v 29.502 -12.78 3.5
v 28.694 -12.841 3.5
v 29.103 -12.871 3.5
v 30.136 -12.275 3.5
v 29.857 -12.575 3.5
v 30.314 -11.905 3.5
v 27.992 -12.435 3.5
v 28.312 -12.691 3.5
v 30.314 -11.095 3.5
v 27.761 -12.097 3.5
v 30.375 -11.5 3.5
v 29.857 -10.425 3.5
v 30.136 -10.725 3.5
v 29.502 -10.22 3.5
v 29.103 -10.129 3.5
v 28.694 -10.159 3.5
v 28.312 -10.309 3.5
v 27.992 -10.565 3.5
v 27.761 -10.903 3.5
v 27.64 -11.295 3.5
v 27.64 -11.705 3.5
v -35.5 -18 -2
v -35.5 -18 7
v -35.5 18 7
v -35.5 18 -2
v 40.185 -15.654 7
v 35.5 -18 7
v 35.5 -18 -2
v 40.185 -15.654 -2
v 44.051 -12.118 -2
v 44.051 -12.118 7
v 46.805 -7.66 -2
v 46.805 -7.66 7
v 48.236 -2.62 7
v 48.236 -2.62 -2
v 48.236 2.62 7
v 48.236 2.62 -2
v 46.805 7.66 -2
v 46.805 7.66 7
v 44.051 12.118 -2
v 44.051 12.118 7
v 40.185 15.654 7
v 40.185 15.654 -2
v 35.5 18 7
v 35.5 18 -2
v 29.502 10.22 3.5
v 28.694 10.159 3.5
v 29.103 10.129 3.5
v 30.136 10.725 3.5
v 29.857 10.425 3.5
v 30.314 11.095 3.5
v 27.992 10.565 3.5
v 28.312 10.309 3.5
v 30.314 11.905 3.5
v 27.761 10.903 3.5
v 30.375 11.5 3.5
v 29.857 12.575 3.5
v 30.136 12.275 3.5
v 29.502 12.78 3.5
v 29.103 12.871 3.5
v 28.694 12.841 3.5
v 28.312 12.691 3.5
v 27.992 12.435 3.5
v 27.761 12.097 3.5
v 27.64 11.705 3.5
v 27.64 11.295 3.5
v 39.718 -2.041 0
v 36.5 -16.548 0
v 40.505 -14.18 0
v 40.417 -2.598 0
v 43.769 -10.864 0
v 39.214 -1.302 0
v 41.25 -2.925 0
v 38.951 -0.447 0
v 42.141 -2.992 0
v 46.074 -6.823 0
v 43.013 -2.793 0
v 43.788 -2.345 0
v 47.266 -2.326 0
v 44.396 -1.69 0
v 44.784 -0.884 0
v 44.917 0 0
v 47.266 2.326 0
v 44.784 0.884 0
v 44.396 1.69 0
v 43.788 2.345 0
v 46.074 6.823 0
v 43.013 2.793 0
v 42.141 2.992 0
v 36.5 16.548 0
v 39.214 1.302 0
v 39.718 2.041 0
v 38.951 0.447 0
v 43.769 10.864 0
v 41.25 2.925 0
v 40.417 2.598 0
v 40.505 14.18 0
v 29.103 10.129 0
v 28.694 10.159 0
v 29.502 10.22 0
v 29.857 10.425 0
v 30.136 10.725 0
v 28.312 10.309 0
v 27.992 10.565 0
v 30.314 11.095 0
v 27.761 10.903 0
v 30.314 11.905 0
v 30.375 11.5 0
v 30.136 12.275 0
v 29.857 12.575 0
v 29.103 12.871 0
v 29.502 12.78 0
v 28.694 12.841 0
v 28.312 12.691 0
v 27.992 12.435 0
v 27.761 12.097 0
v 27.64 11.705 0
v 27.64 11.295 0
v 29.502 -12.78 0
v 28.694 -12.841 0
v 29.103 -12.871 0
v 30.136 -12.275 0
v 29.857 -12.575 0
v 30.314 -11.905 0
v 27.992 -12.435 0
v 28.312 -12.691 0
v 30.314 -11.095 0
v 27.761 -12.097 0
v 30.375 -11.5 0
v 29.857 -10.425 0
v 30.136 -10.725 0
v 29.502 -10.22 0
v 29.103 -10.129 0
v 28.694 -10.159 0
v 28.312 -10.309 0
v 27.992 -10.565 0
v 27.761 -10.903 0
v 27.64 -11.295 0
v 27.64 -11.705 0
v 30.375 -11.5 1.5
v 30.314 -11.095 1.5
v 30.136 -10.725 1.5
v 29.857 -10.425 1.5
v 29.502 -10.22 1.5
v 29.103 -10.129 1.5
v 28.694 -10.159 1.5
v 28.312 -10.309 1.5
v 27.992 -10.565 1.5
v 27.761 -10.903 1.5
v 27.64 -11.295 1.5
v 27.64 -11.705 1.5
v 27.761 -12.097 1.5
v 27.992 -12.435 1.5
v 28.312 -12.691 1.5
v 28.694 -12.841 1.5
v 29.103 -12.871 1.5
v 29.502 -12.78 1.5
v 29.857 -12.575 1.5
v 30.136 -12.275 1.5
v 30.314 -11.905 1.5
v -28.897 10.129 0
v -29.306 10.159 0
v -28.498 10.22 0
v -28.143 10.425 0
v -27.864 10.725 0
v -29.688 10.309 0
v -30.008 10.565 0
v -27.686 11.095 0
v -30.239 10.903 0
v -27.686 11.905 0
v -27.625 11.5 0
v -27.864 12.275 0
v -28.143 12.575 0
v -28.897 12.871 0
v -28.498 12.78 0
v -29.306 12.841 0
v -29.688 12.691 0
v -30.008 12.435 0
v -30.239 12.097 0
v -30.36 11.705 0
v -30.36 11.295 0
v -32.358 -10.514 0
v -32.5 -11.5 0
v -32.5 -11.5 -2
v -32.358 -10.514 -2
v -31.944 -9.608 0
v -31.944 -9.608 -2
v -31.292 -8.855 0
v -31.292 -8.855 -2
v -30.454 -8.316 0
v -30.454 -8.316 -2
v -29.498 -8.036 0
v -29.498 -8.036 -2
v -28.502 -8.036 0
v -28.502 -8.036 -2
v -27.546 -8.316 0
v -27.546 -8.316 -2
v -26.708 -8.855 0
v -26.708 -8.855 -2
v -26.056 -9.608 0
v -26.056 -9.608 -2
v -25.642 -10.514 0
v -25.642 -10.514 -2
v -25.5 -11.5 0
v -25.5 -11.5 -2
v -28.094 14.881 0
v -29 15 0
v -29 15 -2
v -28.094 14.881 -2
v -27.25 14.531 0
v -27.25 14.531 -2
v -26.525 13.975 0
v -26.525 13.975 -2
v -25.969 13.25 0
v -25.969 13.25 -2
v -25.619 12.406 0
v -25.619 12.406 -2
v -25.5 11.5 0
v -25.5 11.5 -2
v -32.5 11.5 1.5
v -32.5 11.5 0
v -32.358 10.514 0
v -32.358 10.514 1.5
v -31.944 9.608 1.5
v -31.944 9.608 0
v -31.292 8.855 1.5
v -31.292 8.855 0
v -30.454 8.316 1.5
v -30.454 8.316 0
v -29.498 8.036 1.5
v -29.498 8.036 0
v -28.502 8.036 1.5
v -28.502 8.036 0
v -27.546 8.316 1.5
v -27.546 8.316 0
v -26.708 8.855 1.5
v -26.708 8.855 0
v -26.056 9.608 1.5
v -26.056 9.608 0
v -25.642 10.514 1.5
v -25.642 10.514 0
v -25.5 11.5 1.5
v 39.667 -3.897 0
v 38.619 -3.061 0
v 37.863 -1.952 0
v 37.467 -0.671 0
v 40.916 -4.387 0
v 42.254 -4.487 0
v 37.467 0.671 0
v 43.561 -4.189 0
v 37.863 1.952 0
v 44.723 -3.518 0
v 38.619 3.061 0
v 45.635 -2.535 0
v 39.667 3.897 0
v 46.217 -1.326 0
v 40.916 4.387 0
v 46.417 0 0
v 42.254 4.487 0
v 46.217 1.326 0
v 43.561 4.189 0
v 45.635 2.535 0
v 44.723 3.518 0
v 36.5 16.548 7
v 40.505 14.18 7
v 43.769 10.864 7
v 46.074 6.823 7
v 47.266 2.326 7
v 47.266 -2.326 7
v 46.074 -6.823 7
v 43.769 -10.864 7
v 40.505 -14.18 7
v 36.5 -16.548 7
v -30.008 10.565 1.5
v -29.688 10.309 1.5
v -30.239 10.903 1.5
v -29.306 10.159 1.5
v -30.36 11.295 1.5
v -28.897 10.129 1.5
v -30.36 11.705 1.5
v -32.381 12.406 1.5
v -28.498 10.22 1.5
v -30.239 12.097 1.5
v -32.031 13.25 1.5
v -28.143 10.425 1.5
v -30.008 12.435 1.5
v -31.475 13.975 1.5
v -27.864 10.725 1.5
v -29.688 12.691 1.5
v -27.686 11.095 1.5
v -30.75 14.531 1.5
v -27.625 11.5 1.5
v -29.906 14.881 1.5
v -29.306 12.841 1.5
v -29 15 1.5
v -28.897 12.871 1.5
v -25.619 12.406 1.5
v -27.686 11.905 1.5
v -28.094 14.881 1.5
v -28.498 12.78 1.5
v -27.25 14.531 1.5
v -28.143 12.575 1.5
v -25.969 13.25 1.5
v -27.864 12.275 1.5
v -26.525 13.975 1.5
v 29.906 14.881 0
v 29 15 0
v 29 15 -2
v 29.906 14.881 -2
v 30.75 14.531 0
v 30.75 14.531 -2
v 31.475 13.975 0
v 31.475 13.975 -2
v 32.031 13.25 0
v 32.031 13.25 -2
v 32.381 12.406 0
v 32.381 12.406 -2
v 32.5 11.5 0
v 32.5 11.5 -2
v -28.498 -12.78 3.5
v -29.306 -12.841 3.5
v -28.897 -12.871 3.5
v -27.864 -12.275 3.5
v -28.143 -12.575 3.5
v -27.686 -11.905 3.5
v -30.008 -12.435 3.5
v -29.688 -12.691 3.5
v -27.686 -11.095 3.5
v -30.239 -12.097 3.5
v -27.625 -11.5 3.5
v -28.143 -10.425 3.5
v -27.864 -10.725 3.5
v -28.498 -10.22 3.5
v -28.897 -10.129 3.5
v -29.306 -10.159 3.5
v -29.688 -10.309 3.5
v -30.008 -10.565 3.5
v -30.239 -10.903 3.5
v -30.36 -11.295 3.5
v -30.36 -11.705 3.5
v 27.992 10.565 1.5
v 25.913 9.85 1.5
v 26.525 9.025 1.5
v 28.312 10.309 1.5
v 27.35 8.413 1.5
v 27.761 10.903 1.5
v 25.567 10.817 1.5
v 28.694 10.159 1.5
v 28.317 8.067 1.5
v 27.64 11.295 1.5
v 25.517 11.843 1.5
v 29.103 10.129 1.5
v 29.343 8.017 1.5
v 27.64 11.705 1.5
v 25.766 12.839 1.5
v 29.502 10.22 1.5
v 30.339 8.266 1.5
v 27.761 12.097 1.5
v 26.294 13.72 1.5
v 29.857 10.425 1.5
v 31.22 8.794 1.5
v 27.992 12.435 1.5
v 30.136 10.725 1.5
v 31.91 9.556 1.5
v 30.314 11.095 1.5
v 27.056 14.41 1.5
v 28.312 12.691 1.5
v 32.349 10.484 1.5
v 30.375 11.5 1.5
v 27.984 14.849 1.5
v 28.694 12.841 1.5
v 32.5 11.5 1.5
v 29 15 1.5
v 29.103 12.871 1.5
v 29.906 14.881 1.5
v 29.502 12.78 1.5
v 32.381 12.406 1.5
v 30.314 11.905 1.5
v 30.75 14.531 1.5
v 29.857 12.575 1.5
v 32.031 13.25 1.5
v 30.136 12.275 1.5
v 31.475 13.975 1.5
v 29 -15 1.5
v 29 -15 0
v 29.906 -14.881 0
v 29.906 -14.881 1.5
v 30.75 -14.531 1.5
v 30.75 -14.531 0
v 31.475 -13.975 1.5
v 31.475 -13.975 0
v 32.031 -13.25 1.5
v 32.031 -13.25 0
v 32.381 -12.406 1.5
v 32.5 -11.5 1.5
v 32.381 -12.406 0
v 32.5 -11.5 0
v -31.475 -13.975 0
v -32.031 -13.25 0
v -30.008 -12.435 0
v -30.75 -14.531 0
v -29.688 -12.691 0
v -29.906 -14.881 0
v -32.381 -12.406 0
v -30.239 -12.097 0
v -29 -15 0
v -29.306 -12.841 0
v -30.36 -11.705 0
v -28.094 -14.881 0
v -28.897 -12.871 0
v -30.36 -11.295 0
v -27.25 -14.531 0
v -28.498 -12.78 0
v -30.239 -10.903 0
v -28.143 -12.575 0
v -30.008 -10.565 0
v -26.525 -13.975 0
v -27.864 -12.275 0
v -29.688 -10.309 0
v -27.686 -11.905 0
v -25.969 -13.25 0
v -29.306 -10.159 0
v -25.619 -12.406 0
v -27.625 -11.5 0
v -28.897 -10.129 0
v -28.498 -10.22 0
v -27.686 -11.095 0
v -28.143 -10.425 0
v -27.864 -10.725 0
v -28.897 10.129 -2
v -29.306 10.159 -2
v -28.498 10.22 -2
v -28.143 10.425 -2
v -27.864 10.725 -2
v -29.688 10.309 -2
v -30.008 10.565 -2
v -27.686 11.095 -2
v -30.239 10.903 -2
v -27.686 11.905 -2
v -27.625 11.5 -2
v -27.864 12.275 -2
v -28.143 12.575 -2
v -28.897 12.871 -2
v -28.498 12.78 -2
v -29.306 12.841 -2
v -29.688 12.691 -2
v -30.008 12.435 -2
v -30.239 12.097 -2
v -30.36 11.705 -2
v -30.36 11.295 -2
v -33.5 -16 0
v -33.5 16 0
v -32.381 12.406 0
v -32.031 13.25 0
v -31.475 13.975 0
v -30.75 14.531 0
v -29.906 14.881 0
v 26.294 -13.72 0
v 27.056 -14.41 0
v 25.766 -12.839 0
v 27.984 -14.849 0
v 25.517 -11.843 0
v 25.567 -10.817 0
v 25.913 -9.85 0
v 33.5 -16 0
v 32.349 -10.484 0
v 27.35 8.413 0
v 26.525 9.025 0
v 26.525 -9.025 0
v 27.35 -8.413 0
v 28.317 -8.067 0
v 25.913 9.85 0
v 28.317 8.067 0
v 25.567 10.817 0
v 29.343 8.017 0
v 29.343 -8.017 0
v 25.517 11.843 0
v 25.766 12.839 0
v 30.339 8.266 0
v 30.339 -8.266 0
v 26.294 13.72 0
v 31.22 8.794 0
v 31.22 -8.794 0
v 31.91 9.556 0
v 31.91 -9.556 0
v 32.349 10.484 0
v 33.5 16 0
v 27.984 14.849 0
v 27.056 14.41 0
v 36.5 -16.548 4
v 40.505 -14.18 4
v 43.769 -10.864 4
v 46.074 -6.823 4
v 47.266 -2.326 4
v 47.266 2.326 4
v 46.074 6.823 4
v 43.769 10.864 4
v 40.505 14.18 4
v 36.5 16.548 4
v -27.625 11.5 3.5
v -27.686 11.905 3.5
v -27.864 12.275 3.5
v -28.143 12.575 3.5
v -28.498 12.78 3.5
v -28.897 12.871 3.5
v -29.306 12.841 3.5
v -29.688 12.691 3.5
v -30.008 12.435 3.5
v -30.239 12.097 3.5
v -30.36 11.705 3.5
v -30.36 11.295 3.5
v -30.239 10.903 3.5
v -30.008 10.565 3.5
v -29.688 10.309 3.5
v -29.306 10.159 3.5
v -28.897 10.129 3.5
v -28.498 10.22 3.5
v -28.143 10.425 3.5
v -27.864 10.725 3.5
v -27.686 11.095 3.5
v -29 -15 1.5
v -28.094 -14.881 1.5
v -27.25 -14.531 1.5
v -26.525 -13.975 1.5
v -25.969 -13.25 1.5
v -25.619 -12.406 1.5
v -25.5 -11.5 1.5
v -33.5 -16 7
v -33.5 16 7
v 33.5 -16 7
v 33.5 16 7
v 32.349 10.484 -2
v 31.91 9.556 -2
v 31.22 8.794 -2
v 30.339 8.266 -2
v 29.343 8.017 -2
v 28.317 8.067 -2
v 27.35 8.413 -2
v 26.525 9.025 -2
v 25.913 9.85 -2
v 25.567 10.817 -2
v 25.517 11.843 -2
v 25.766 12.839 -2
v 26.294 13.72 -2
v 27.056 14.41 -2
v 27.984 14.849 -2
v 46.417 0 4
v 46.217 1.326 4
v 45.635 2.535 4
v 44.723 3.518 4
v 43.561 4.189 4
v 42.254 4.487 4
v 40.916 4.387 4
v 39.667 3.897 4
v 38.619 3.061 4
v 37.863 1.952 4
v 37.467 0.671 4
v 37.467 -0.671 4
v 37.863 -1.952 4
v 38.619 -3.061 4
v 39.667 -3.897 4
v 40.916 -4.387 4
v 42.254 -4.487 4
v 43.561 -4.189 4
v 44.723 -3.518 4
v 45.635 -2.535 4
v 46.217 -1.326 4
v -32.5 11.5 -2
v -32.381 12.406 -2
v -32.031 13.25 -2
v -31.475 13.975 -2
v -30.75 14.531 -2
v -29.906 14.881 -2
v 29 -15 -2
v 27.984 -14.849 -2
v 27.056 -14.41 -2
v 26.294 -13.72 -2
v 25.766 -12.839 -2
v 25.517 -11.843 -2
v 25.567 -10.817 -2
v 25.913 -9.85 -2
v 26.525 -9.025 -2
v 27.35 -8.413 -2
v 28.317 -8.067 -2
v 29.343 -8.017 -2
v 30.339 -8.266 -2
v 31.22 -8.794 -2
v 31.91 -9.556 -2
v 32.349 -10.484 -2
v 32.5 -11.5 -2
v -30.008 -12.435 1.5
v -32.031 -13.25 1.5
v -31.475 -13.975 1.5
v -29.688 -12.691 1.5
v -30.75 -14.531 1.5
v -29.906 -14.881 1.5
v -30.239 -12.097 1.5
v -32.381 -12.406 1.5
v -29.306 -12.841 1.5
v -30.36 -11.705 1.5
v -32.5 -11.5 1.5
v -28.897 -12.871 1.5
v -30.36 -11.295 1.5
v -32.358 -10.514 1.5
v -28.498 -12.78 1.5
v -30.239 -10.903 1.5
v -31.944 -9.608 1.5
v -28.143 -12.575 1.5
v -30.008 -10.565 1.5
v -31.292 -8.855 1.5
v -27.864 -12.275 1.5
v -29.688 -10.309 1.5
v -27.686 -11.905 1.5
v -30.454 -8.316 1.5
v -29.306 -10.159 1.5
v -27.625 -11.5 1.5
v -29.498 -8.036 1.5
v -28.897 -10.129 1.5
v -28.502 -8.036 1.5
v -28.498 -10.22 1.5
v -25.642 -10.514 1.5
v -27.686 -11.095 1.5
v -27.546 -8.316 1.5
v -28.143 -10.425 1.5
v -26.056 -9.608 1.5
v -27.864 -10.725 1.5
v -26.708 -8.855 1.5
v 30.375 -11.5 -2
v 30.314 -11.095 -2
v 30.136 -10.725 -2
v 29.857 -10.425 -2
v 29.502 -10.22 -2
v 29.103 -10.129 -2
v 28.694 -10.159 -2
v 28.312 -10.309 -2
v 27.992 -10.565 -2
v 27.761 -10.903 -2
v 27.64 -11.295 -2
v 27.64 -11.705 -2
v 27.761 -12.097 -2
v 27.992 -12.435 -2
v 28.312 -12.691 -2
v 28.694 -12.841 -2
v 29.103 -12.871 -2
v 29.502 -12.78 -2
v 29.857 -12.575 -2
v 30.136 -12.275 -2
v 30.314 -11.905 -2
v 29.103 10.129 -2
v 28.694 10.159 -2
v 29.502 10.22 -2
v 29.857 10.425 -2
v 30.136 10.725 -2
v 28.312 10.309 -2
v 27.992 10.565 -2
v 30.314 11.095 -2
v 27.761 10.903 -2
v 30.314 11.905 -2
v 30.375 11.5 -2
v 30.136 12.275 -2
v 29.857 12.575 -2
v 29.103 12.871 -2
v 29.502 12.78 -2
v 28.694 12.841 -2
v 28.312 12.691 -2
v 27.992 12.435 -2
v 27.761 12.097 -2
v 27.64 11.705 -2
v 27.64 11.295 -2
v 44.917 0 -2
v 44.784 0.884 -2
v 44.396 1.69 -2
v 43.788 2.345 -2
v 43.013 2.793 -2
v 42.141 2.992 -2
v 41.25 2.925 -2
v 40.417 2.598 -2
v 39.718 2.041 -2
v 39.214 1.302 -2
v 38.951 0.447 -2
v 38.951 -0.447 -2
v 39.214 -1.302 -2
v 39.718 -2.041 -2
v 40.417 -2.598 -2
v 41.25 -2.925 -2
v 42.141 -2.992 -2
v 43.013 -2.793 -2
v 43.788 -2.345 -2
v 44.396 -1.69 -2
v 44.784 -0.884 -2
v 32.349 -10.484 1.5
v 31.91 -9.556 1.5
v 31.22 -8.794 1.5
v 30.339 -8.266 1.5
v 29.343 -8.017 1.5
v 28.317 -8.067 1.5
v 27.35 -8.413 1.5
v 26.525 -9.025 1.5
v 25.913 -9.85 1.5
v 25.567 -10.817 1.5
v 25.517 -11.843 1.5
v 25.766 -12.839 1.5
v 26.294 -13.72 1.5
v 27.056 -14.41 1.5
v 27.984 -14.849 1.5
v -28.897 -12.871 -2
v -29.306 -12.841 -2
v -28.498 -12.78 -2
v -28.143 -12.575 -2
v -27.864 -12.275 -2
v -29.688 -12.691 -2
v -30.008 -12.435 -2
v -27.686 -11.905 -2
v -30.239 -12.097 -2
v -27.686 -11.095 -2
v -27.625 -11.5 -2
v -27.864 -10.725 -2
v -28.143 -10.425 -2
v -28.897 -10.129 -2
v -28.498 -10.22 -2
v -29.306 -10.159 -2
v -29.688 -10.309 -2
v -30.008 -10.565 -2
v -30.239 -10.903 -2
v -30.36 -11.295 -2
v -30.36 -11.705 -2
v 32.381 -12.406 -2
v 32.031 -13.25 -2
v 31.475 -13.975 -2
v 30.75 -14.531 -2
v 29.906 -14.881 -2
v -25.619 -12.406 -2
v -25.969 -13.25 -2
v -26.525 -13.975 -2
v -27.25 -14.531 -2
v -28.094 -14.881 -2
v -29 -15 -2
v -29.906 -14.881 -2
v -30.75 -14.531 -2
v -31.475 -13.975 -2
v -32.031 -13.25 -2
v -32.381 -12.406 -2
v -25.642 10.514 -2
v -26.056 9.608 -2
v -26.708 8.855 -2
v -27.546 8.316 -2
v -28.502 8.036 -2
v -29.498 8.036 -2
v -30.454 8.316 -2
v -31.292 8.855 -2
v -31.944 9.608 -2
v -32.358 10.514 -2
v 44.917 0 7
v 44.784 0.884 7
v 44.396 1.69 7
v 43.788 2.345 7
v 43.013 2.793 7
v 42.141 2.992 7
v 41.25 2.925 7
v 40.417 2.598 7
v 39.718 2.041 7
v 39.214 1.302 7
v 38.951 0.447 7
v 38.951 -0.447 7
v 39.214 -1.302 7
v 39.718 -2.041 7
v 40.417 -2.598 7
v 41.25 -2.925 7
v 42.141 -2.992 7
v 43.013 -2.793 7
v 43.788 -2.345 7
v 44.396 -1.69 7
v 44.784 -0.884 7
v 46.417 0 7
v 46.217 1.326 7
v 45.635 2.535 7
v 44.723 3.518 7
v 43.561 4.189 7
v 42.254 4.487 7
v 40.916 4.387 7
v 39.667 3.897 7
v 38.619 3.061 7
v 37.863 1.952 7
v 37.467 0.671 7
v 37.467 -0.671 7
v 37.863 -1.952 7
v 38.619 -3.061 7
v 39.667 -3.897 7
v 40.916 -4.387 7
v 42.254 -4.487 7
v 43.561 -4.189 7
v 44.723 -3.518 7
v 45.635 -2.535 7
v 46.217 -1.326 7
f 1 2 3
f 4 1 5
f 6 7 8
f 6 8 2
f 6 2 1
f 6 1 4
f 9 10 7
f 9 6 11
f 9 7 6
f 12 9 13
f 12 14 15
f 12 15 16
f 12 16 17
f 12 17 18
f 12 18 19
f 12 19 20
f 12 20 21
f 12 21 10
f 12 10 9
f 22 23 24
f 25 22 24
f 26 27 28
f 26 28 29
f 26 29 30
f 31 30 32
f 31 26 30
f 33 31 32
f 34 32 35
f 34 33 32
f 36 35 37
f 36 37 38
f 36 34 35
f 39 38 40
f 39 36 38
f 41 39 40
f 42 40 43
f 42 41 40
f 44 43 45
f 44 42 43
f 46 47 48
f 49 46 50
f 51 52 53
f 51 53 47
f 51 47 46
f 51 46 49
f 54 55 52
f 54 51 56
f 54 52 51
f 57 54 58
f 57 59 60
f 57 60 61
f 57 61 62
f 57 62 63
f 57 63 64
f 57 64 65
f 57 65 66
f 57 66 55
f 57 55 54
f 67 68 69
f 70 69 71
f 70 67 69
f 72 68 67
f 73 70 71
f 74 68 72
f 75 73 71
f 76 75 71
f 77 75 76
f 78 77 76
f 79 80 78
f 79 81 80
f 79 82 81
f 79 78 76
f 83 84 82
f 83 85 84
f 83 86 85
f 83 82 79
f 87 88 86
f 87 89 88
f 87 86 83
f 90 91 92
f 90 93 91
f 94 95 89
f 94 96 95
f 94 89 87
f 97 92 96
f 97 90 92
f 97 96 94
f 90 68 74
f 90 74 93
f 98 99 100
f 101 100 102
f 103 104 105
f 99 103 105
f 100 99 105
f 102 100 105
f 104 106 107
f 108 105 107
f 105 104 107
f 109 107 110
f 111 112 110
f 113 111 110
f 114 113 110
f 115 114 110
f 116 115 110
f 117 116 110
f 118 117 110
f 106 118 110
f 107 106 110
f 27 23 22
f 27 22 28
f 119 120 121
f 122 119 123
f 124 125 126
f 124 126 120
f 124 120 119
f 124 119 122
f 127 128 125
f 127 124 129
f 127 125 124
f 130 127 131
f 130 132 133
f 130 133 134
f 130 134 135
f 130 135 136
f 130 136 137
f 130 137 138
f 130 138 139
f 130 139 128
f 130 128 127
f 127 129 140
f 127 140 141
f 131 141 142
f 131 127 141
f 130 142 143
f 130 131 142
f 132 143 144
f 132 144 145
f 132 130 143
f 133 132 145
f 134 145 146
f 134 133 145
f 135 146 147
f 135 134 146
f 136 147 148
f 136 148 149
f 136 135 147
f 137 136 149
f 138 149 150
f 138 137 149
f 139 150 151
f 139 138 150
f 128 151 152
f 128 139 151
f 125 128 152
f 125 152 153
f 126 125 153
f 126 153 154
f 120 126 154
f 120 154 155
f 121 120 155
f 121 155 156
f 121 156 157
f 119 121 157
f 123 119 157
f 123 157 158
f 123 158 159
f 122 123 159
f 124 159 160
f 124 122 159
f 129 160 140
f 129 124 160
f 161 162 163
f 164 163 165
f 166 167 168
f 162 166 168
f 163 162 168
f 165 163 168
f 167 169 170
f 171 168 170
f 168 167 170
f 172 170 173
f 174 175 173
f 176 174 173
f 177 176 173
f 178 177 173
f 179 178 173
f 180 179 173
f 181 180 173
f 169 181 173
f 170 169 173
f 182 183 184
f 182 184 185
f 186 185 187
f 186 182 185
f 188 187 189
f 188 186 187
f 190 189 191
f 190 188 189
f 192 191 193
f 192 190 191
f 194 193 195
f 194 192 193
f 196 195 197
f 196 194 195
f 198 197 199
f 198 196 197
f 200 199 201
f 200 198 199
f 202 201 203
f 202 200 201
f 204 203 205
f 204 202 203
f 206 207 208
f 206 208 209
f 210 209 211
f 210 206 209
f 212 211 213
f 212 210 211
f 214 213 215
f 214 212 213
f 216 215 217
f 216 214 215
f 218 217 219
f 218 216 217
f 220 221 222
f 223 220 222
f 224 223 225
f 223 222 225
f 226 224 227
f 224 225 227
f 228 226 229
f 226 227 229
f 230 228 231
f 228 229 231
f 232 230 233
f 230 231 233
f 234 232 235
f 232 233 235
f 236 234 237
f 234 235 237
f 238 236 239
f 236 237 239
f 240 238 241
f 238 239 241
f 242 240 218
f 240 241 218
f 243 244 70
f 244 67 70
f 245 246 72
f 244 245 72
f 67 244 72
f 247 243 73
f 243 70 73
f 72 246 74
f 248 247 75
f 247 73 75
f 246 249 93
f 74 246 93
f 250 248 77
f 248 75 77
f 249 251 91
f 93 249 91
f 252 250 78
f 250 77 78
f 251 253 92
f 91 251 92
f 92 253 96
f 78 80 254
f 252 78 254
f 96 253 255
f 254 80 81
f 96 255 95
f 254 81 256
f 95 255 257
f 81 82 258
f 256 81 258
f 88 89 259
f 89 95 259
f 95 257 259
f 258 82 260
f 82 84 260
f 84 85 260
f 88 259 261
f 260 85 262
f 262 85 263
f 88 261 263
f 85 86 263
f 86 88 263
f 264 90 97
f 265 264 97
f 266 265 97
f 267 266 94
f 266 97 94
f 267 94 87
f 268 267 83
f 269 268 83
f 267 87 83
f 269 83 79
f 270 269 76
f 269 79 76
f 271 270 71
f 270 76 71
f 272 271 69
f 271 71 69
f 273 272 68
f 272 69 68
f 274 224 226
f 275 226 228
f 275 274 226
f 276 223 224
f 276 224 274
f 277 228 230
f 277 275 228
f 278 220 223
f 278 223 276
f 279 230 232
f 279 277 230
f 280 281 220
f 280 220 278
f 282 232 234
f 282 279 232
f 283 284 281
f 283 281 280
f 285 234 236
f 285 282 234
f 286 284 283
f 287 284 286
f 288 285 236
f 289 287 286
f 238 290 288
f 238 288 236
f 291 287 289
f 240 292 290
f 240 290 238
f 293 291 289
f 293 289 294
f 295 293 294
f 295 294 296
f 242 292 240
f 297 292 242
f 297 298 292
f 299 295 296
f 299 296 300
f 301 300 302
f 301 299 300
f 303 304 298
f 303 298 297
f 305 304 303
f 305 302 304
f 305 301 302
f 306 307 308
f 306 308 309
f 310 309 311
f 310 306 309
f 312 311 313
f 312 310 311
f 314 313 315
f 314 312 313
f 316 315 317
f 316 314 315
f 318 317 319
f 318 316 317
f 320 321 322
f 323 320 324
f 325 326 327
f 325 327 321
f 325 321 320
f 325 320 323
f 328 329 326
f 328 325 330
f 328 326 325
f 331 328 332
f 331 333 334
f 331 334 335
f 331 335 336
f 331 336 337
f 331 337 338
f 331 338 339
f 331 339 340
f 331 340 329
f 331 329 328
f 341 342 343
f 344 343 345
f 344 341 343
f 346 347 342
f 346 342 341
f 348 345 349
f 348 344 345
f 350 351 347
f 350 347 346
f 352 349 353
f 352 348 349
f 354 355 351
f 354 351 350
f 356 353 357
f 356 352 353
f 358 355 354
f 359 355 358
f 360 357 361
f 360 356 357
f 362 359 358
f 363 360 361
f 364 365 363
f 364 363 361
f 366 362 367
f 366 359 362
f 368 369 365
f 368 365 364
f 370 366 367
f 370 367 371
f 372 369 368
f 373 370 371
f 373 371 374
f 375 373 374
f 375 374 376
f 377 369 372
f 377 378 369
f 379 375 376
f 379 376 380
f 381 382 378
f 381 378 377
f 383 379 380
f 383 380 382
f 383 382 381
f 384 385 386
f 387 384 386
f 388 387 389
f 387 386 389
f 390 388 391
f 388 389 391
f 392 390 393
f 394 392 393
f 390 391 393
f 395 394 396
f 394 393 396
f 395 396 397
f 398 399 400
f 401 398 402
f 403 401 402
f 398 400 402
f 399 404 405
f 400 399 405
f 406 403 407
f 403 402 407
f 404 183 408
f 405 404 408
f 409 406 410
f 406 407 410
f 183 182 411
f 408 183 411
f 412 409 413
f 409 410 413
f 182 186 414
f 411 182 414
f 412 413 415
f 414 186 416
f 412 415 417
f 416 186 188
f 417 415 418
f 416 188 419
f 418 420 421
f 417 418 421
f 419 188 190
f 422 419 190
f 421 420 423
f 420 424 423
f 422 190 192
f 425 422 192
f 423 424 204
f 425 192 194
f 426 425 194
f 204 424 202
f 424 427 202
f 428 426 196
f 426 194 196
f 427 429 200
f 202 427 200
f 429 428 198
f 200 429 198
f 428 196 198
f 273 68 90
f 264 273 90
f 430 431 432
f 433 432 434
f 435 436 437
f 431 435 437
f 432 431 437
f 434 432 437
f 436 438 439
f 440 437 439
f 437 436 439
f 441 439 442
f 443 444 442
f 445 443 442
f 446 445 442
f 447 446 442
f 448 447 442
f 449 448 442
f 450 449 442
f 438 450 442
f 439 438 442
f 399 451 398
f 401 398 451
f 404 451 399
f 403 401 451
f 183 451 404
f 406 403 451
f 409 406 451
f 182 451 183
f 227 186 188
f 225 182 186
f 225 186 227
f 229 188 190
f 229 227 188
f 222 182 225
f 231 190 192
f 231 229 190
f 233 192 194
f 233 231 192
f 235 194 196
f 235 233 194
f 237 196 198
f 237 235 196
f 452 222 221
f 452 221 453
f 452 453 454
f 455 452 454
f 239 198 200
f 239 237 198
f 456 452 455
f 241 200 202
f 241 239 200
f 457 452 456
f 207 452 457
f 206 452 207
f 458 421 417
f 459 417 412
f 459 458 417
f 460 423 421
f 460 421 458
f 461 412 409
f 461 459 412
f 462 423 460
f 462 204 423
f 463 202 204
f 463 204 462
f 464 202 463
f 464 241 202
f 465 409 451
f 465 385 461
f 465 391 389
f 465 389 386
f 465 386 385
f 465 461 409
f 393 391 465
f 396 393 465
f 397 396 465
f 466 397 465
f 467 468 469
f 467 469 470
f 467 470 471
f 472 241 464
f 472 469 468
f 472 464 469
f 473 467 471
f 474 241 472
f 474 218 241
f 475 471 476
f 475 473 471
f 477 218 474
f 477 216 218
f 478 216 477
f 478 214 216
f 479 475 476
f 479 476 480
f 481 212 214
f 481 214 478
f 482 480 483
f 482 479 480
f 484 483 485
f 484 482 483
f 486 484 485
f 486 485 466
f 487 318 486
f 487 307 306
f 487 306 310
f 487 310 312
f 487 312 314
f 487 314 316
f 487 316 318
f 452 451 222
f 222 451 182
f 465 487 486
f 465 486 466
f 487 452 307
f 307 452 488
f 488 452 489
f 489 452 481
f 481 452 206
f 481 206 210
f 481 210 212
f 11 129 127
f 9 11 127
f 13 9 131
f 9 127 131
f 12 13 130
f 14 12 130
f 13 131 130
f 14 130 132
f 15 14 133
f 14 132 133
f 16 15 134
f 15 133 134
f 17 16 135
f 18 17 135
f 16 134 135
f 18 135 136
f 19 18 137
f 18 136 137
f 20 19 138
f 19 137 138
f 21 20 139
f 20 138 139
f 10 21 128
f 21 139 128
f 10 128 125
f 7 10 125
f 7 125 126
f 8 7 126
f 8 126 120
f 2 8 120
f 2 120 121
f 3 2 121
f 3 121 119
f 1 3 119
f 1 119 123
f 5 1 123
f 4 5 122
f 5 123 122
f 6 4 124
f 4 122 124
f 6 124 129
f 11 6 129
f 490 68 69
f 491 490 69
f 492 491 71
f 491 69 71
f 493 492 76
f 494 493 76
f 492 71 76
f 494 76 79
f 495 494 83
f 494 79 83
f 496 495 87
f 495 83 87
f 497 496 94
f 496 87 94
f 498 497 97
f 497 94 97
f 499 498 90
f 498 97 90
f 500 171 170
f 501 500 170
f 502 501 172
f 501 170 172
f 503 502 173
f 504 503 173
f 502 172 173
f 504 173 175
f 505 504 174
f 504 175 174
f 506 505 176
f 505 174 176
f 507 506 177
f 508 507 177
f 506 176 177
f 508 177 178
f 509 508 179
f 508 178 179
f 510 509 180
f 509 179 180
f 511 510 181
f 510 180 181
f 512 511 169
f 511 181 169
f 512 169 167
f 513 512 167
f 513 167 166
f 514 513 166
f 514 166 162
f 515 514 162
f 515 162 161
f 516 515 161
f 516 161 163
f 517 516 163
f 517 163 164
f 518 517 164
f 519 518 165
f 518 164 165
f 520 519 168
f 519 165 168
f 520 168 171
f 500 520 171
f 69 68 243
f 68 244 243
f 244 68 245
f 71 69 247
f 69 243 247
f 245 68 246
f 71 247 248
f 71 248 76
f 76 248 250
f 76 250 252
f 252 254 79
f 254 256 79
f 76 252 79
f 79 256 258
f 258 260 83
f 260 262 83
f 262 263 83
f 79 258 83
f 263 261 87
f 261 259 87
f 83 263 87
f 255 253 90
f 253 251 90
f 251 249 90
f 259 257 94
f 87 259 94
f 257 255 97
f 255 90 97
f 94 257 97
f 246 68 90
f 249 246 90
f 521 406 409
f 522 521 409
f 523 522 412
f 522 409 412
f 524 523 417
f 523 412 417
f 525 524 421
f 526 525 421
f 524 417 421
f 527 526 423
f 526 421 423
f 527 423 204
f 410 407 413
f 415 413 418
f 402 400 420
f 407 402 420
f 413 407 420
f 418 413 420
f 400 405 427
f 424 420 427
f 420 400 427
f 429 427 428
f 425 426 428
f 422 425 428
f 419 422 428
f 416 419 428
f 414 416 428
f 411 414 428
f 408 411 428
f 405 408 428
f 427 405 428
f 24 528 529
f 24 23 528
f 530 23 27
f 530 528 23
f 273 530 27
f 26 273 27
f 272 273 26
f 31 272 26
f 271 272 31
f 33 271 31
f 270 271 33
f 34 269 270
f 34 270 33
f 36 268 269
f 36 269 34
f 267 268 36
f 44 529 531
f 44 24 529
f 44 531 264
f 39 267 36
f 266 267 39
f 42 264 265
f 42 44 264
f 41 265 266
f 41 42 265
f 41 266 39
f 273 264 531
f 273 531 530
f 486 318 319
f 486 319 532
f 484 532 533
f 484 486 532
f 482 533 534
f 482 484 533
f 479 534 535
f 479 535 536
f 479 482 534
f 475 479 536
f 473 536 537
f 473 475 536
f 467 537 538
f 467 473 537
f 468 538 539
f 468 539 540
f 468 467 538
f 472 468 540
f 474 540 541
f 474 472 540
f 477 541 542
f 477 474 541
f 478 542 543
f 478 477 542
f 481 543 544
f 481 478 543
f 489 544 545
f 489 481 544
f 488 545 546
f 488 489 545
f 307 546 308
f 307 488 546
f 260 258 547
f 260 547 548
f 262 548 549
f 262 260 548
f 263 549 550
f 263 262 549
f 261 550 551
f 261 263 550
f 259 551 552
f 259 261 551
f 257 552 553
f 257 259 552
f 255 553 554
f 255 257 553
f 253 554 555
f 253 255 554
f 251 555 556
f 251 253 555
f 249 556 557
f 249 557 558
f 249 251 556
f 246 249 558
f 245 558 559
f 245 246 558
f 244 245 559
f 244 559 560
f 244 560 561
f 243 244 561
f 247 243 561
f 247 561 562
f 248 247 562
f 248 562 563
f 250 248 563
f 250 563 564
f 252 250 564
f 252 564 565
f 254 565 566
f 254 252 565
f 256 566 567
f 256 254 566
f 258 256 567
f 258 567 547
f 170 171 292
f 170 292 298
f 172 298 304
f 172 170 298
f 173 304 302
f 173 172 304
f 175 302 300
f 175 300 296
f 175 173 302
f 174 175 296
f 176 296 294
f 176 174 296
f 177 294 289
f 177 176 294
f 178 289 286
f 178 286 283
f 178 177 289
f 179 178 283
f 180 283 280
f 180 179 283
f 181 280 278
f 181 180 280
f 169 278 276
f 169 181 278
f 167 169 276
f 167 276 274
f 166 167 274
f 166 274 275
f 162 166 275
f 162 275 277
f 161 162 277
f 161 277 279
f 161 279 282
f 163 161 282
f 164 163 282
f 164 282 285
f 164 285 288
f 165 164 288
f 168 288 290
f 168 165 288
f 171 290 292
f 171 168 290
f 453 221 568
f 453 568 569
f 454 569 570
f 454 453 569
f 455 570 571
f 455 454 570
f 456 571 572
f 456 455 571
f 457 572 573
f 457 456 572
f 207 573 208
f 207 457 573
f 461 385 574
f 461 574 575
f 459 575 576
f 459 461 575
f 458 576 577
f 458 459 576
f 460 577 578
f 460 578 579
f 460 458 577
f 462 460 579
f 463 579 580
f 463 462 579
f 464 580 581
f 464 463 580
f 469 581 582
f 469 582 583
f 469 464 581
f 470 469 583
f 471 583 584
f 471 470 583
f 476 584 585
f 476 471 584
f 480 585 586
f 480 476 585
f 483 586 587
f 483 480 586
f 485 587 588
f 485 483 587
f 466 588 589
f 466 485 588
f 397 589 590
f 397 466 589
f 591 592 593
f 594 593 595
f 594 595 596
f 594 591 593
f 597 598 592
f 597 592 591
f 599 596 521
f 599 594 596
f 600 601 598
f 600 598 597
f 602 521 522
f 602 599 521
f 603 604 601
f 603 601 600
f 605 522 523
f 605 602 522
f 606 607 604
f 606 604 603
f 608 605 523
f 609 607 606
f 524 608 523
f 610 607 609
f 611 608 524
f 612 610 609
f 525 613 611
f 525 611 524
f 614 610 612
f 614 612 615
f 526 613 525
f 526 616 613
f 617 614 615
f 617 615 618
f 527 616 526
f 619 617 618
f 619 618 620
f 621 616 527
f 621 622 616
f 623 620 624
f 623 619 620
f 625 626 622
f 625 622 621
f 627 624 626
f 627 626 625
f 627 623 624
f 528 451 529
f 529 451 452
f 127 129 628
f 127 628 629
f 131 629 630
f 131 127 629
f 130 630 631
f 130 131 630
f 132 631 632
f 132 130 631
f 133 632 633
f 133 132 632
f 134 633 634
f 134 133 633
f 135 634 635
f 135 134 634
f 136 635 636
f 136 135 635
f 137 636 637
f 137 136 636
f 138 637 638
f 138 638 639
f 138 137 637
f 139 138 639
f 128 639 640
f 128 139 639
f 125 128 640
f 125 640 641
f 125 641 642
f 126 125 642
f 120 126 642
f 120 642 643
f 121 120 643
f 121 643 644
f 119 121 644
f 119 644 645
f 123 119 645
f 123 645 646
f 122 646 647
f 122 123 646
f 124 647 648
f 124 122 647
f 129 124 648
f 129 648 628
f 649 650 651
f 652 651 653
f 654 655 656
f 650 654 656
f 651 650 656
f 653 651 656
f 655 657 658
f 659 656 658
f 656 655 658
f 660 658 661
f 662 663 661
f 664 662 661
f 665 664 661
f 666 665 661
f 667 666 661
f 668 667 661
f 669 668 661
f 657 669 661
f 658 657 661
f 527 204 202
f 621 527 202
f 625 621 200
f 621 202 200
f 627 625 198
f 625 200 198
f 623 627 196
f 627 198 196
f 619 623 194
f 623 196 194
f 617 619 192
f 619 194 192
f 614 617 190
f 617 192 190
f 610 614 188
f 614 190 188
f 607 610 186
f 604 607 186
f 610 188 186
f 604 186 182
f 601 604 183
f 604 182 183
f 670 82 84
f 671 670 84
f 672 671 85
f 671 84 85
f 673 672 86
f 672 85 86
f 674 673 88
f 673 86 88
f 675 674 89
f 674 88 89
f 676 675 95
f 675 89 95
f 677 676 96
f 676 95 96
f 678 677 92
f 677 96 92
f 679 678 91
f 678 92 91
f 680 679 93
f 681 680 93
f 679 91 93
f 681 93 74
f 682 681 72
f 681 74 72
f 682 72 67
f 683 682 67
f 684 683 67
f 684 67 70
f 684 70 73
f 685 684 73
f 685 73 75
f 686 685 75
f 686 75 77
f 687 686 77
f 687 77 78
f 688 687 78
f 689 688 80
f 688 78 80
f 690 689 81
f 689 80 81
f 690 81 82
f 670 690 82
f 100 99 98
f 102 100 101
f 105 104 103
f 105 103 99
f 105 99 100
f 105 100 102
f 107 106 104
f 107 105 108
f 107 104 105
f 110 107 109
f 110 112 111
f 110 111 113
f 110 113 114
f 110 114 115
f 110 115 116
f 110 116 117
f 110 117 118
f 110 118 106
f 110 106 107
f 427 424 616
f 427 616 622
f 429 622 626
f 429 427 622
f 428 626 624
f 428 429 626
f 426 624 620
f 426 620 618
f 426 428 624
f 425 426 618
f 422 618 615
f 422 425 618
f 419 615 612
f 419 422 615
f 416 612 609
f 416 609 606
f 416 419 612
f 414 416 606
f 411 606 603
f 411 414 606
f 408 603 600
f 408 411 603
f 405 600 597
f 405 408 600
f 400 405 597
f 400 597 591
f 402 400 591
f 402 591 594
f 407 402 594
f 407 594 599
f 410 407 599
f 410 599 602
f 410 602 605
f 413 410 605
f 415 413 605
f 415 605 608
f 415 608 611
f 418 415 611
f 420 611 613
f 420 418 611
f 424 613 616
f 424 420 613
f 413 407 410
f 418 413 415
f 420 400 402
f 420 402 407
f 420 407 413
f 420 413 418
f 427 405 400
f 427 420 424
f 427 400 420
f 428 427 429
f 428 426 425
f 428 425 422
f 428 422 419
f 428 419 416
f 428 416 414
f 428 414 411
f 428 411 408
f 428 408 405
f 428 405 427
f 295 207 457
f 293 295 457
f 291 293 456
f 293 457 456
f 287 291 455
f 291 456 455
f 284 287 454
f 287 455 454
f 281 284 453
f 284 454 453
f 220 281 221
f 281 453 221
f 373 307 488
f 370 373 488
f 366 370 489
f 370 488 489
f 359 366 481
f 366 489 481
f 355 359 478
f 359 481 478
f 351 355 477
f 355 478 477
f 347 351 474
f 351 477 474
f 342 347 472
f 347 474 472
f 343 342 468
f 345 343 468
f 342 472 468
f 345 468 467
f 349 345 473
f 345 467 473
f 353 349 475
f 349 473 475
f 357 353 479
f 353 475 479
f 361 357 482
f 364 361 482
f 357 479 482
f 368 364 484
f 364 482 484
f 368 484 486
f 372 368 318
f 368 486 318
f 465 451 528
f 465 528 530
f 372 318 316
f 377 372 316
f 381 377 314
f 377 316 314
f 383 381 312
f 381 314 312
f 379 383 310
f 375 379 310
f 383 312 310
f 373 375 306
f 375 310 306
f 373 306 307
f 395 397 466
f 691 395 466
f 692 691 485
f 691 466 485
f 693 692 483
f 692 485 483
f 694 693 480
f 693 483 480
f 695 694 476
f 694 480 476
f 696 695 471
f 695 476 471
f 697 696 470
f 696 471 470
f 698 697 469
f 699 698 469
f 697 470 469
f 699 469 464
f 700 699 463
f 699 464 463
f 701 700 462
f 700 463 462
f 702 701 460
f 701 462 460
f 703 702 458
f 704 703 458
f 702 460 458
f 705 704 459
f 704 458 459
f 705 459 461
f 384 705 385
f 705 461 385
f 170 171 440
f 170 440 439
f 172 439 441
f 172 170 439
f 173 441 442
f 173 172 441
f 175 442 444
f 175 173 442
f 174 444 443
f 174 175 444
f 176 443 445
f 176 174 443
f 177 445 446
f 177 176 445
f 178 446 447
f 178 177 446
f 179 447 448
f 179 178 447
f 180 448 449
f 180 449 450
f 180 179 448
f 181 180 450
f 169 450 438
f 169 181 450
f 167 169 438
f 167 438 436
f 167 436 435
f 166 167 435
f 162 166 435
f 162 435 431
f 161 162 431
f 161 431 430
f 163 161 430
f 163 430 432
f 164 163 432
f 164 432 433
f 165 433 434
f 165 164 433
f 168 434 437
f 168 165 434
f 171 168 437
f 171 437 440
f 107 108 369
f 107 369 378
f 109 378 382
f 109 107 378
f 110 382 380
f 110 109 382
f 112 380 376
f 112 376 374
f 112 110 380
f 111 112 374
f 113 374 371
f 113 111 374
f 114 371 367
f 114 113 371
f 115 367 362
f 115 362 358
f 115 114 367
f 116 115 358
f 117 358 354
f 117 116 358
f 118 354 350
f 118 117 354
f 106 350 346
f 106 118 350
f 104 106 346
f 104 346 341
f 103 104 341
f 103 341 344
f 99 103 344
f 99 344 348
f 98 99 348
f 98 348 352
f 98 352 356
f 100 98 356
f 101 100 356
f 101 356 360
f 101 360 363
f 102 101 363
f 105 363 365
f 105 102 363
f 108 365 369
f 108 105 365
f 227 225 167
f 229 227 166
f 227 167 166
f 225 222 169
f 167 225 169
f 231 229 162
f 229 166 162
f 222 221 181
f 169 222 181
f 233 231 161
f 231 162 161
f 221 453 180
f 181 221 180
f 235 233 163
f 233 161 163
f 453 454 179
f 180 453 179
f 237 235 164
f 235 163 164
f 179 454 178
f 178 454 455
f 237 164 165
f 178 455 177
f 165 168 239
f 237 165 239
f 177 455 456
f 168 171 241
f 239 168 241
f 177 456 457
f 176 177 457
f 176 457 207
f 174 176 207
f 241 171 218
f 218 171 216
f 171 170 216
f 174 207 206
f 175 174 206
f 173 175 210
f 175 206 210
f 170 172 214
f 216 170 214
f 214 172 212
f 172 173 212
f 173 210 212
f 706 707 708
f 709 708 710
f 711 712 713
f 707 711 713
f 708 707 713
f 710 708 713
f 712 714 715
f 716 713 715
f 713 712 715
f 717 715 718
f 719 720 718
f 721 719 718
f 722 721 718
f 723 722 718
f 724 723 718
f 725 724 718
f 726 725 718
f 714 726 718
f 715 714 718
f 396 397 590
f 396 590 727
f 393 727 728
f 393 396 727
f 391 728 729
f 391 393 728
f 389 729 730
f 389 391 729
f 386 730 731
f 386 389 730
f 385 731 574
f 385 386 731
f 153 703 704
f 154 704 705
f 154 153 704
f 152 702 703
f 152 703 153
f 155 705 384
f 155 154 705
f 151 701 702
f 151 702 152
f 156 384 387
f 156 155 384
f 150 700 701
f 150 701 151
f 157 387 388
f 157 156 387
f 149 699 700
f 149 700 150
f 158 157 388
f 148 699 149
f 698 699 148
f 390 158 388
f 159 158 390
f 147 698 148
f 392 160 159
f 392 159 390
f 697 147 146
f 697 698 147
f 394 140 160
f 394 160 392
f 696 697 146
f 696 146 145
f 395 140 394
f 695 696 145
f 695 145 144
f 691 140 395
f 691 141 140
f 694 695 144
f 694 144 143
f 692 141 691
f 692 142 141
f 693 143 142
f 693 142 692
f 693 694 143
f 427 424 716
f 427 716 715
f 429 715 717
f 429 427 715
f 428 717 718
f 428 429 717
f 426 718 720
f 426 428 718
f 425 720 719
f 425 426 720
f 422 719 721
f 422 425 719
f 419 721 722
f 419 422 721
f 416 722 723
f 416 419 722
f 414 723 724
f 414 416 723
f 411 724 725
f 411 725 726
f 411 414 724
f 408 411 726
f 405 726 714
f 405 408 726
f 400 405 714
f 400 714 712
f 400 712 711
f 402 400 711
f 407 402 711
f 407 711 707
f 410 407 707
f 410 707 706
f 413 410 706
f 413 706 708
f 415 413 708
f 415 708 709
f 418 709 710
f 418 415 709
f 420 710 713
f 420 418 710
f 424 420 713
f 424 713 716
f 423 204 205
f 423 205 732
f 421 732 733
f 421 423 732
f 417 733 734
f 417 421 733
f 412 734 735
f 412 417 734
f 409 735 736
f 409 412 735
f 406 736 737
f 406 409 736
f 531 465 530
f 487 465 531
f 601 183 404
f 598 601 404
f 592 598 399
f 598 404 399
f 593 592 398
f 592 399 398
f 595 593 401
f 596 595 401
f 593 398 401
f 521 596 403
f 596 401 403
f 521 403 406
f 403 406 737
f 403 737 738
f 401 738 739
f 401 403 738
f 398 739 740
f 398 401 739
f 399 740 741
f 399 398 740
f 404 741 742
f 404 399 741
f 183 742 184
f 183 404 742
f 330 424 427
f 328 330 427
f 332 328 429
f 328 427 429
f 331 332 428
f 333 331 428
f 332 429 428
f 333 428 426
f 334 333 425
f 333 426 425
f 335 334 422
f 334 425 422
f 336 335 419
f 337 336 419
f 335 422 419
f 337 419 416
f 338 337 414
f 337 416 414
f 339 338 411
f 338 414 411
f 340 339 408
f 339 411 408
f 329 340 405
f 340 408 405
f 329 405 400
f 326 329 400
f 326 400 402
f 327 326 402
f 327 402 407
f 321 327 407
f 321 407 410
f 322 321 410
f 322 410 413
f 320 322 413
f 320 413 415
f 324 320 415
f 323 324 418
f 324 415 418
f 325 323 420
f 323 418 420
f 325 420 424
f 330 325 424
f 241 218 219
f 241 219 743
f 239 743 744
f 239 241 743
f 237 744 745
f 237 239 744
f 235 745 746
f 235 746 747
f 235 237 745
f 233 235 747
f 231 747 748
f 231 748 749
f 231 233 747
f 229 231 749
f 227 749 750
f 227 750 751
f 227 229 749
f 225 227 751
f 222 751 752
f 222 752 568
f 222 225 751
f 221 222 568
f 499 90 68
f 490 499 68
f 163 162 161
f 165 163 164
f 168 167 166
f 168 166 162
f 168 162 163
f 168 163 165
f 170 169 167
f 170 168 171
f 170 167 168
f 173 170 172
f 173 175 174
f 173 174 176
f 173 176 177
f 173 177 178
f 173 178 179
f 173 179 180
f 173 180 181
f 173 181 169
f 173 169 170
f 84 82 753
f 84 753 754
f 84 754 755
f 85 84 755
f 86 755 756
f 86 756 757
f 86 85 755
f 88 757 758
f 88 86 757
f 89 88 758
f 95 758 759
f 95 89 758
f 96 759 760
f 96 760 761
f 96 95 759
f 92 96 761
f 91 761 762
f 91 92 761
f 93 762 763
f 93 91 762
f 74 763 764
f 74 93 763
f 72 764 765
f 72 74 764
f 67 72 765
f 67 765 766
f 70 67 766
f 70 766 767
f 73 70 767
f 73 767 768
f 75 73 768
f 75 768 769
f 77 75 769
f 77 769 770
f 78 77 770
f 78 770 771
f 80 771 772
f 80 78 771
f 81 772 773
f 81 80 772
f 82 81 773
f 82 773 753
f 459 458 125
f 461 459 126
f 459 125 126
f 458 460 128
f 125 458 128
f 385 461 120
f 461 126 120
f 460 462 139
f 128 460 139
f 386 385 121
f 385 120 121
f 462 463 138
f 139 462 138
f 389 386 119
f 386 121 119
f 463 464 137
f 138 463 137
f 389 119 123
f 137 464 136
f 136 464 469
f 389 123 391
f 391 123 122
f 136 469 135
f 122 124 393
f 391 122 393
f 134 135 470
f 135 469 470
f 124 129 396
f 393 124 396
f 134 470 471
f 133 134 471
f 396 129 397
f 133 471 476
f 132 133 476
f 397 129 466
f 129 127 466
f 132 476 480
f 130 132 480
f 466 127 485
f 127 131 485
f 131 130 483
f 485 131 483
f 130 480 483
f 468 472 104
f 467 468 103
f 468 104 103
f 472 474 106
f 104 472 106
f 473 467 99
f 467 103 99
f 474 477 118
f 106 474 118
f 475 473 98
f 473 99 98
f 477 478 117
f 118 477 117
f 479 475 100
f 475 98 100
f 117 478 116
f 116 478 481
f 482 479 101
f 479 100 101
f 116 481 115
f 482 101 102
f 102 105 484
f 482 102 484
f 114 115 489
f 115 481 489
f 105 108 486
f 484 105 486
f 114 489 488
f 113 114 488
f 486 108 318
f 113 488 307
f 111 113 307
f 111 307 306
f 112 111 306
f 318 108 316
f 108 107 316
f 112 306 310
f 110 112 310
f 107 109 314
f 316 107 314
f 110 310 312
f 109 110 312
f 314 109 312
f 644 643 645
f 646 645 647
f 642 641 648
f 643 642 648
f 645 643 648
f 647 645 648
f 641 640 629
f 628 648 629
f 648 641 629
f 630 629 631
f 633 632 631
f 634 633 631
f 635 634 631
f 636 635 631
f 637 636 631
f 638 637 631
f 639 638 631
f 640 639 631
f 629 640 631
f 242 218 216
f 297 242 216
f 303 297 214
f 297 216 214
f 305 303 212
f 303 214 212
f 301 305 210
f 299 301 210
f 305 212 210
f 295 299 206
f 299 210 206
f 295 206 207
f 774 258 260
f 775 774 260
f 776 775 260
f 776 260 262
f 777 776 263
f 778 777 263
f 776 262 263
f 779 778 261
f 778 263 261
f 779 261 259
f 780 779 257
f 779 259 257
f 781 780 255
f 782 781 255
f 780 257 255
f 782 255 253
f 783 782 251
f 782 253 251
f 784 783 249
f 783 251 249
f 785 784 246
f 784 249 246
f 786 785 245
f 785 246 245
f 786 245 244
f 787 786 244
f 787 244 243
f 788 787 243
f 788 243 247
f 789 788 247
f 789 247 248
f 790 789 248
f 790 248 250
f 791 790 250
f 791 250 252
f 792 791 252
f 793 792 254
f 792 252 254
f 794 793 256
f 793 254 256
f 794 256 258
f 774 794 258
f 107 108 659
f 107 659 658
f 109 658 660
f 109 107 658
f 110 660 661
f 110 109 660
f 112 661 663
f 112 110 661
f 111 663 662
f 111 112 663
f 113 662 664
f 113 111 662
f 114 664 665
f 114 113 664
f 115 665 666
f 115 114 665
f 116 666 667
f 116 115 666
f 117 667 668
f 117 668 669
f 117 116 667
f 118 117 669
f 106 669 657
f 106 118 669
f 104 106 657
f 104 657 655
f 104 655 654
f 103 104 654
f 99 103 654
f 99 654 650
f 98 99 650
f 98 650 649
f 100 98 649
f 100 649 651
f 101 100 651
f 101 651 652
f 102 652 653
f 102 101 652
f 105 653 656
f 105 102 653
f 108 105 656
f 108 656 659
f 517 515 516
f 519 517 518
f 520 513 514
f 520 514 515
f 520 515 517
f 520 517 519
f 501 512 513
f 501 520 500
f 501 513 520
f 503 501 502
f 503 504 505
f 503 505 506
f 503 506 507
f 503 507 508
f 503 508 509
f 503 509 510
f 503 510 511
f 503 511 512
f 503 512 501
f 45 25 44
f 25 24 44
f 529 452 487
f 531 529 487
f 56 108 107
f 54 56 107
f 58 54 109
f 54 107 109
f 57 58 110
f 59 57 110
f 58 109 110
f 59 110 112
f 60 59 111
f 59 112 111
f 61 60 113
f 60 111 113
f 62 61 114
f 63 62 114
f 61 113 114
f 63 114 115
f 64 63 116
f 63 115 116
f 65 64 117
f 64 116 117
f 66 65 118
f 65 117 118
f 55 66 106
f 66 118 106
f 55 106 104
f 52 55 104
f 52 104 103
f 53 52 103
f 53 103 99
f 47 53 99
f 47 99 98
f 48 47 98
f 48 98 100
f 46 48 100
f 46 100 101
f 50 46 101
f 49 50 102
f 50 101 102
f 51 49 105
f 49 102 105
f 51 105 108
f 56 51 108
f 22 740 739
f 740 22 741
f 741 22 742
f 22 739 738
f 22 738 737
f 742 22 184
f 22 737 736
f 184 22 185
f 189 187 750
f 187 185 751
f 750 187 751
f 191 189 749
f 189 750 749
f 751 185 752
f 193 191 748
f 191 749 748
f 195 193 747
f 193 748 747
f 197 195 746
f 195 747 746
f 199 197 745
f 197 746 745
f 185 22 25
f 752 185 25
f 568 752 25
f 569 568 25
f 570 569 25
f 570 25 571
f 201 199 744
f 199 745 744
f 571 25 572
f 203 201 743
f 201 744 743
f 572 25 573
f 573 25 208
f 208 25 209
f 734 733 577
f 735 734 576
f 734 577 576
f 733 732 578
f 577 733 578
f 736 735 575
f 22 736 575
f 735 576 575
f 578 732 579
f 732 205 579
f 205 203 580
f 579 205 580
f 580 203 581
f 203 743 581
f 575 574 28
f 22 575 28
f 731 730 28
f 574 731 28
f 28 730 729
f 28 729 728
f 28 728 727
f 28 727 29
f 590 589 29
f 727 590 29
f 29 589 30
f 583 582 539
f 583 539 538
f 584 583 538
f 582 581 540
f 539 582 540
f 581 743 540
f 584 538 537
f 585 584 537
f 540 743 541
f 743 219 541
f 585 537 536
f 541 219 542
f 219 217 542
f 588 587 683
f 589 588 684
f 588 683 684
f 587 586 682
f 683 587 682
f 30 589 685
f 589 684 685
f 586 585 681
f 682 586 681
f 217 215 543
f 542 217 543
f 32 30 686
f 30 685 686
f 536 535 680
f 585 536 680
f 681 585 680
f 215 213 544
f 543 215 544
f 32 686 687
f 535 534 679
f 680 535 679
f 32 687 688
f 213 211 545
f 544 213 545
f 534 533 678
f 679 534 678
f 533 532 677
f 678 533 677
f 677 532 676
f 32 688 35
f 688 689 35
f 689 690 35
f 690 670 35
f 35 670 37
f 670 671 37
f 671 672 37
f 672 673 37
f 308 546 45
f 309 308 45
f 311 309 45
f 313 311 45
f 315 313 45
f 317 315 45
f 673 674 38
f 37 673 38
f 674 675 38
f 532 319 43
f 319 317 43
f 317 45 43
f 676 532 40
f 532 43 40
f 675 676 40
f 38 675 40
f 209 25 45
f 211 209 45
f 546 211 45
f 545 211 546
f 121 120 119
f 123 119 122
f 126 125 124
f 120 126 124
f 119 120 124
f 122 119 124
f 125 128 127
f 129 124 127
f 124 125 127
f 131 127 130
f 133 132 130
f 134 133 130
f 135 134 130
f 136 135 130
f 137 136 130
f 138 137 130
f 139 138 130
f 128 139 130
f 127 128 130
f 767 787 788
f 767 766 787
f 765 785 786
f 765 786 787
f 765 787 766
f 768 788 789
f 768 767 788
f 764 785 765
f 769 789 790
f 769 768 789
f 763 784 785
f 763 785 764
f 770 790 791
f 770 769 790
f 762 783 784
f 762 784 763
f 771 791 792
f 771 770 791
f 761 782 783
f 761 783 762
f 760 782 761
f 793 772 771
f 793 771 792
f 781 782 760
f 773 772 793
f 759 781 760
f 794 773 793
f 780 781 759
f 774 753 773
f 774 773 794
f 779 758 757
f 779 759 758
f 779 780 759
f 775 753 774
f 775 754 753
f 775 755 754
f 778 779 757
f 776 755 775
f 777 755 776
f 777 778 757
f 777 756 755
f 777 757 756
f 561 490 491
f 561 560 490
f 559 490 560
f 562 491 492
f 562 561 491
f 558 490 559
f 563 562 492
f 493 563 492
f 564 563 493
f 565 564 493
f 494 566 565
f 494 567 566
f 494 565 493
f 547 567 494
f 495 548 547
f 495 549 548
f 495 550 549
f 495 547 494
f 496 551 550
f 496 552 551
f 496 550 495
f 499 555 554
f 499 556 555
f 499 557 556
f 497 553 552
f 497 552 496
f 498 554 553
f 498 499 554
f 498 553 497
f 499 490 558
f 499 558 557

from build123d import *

# Parameters (mm, degrees)
F0_W     = 71
F0_H     = 36
F0_W_2   = 67
F0_H_2   = 32
F1_DEPTH = 7
F0_R     = 4.5
F0_R_2   = 3
F2_DEPTH = 2
F0_R_3   = 1.375
F3_DEPTH = 3.5
F4_DEPTH = 1.5
F5_DEPTH = 4


with BuildPart() as f1:
    # F0 (on Top) → F1 (new body)
    with BuildSketch(Plane.XY):
        Rectangle(F0_W, F0_H)
        Rectangle(F0_W_2, F0_H_2, mode=Mode.SUBTRACT)
        with BuildLine():
            ThreePointArc((35.5, -18), (48.4172374697, 0), (35.5, 18))
            Line((35.5, 18), (35.5, -18))
        make_face()
        with BuildLine():
            ThreePointArc((36.5, 16.5479447346), (47.4172374697, 0), (36.5, -16.5479447346))
            Line((36.5, -16.5479447346), (36.5, 16.5479447346))
        make_face(mode=Mode.SUBTRACT)
    extrude(amount=F1_DEPTH)

    # F0 (on Top) → F2 (join)
    with BuildSketch(Plane.XY):
        Rectangle(F0_W, F0_H)
        Rectangle(F0_W_2, F0_H_2, mode=Mode.SUBTRACT)
        Rectangle(F0_W_2, F0_H_2)
        Polygon((32.5, -11.5), (32.5, -15), (29, -15), (-29, -15), (-32.5, -15), (-32.5, -11.5), (-32.5, 11.5000000158), (-32.5, 15), (-29, 15), (29, 15), (32.5, 15), (32.5, 11.5), align=None, mode=Mode.SUBTRACT)
        with BuildLine():
            Line((-29, -15), (29, -15))
            ThreePointArc((29, -15), (26.5251262658, -9.0251262658), (32.5, -11.5))
            Line((32.5, -11.5), (32.5, 11.5))
            ThreePointArc((32.5, 11.5), (26.5251262658, 9.0251262658), (29, 15))
            Line((29, 15), (-29, 15))
            ThreePointArc((-29, 15), (-26.5251262658, 13.9748737342), (-25.5, 11.5))
            ThreePointArc((-25.5, 11.5), (-29.0000000079, 8), (-32.5, 11.5000000158))
            Line((-32.5, 11.5000000158), (-32.5, -11.5))
            ThreePointArc((-32.5, -11.5), (-29, -8), (-25.5, -11.5))
            ThreePointArc((-25.5, -11.5), (-26.5251262658, -13.9748737342), (-29, -15))
        make_face()
        with BuildLine():
            ThreePointArc((35.5, -18), (48.4172374697, 0), (35.5, 18))
            Line((35.5, 18), (35.5, -18))
        make_face()
        with BuildLine():
            ThreePointArc((36.5, 16.5479447346), (47.4172374697, 0), (36.5, -16.5479447346))
            Line((36.5, -16.5479447346), (36.5, 16.5479447346))
        make_face(mode=Mode.SUBTRACT)
        with BuildLine():
            Line((36.5, 16.5479447346), (36.5, -16.5479447346))
            ThreePointArc((36.5, -16.5479447346), (47.4172374697, 0), (36.5, 16.5479447346))
        make_face()
        with Locations((41.9172374697, 0)):
            Circle(F0_R, mode=Mode.SUBTRACT)
        with Locations((41.9172374697, 0)):
            Circle(F0_R)
        with Locations((41.9172374697, 0)):
            Circle(F0_R_2, mode=Mode.SUBTRACT)
        with BuildLine():
            Line((29, -15), (32.5, -15))
            Line((32.5, -15), (32.5, -11.5))
            ThreePointArc((32.5, -11.5), (31.4748737342, -13.9748737342), (29, -15))
        make_face()
        with BuildLine():
            Line((-32.5, -15), (-29, -15))
            ThreePointArc((-29, -15), (-31.4748737342, -13.9748737342), (-32.5, -11.5))
            Line((-32.5, -11.5), (-32.5, -15))
        make_face()
        with BuildLine():
            Line((-32.5, 15), (-32.5, 11.5000000158))
            ThreePointArc((-32.5, 11.5000000158), (-31.4748737286, 13.9748737397), (-29, 15))
            Line((-29, 15), (-32.5, 15))
        make_face()
        with BuildLine():
            ThreePointArc((29, 15), (31.4748737342, 13.9748737342), (32.5, 11.5))
            Line((32.5, 11.5), (32.5, 15))
            Line((32.5, 15), (29, 15))
        make_face()
    extrude(amount=-F2_DEPTH)


with BuildPart() as f1b:
    # F0 (on Top) → F1, piece 2 (new body)
    with BuildSketch(Plane.XY):
        with Locations((41.9172374697, 0)):
            Circle(F0_R)
        with Locations((41.9172374697, 0)):
            Circle(F0_R_2, mode=Mode.SUBTRACT)
    extrude(amount=F1_DEPTH)


with BuildPart() as f2:
    # F0 (on Top) → F2, piece 2 (new body)
    with BuildSketch(Plane.XY):
        with Locations((29, -11.5)):
            Circle(F0_R_3)
    extrude(amount=-F2_DEPTH)


with BuildPart() as f2b:
    # F0 (on Top) → F2, piece 3 (new body)
    with BuildSketch(Plane.XY):
        with Locations((29, 11.5)):
            Circle(F0_R_3)
    extrude(amount=-F2_DEPTH)


with BuildPart() as f2c:
    # F0 (on Top) → F2, piece 4 (new body)
    with BuildSketch(Plane.XY):
        with Locations((-29, -11.5)):
            Circle(F0_R_3)
    extrude(amount=-F2_DEPTH)


with BuildPart() as f2d:
    # F0 (on Top) → F2, piece 5 (new body)
    with BuildSketch(Plane.XY):
        with Locations((-29, 11.5)):
            Circle(F0_R_3)
    extrude(amount=-F2_DEPTH)


with BuildPart() as f3:
    # F0 (on Top) → F3 (new body)
    with BuildSketch(Plane.XY):
        with Locations((29, 11.5)):
            Circle(F0_R_3)
    extrude(amount=F3_DEPTH)


with BuildPart() as f3b:
    # F0 (on Top) → F3, piece 2 (new body)
    with BuildSketch(Plane.XY):
        with Locations((29, -11.5)):
            Circle(F0_R_3)
    extrude(amount=F3_DEPTH)


with BuildPart() as f3c:
    # F0 (on Top) → F3, piece 3 (new body)
    with BuildSketch(Plane.XY):
        with Locations((-29, -11.5)):
            Circle(F0_R_3)
    extrude(amount=F3_DEPTH)


with BuildPart() as f3d:
    # F0 (on Top) → F3, piece 4 (new body)
    with BuildSketch(Plane.XY):
        with Locations((-29, 11.5)):
            Circle(F0_R_3)
    extrude(amount=F3_DEPTH)


with BuildPart() as f4:
    # F0 (on Top) → F4 (new body)
    with BuildSketch(Plane.XY):
        with BuildLine():
            ThreePointArc((-29, 15), (-31.4748737286, 13.9748737397), (-32.5, 11.5000000158))
            ThreePointArc((-32.5, 11.5000000158), (-29.0000000079, 8), (-25.5, 11.5))
            ThreePointArc((-25.5, 11.5), (-26.5251262658, 13.9748737342), (-29, 15))
        make_face()
        with Locations((-29, 11.5)):
            Circle(F0_R_3, mode=Mode.SUBTRACT)
    extrude(amount=F4_DEPTH)


with BuildPart() as f4b:
    # F0 (on Top) → F4, piece 2 (new body)
    with BuildSketch(Plane.XY):
        with BuildLine():
            ThreePointArc((29, 15), (26.5251262658, 9.0251262658), (32.5, 11.5))
            ThreePointArc((32.5, 11.5), (31.4748737342, 13.9748737342), (29, 15))
        make_face()
        with Locations((29, 11.5)):
            Circle(F0_R_3, mode=Mode.SUBTRACT)
    extrude(amount=F4_DEPTH)


with BuildPart() as f4c:
    # F0 (on Top) → F4, piece 3 (new body)
    with BuildSketch(Plane.XY):
        with BuildLine():
            ThreePointArc((32.5, -11.5), (26.5251262658, -9.0251262658), (29, -15))
            ThreePointArc((29, -15), (31.4748737342, -13.9748737342), (32.5, -11.5))
        make_face()
        with Locations((29, -11.5)):
            Circle(F0_R_3, mode=Mode.SUBTRACT)
    extrude(amount=F4_DEPTH)


with BuildPart() as f4d:
    # F0 (on Top) → F4, piece 4 (new body)
    with BuildSketch(Plane.XY):
        with BuildLine():
            ThreePointArc((-32.5, -11.5), (-31.4748737342, -13.9748737342), (-29, -15))
            ThreePointArc((-29, -15), (-26.5251262658, -13.9748737342), (-25.5, -11.5))
            ThreePointArc((-25.5, -11.5), (-29, -8), (-32.5, -11.5))
        make_face()
        with Locations((-29, -11.5)):
            Circle(F0_R_3, mode=Mode.SUBTRACT)
    extrude(amount=F4_DEPTH)


with BuildPart() as f5:
    # F0 (on Top) → F5 (new body)
    with BuildSketch(Plane.XY):
        with BuildLine():
            Line((36.5, 16.5479447346), (36.5, -16.5479447346))
            ThreePointArc((36.5, -16.5479447346), (47.4172374697, 0), (36.5, 16.5479447346))
        make_face()
        with Locations((41.9172374697, 0)):
            Circle(F0_R, mode=Mode.SUBTRACT)
    extrude(amount=F5_DEPTH)


solid = Compound([f1.part, f1b.part, f2.part, f2b.part, f2c.part, f2d.part, f3.part, f3b.part, f3c.part, f3d.part, f4.part, f4b.part, f4c.part, f4d.part, f5.part])
